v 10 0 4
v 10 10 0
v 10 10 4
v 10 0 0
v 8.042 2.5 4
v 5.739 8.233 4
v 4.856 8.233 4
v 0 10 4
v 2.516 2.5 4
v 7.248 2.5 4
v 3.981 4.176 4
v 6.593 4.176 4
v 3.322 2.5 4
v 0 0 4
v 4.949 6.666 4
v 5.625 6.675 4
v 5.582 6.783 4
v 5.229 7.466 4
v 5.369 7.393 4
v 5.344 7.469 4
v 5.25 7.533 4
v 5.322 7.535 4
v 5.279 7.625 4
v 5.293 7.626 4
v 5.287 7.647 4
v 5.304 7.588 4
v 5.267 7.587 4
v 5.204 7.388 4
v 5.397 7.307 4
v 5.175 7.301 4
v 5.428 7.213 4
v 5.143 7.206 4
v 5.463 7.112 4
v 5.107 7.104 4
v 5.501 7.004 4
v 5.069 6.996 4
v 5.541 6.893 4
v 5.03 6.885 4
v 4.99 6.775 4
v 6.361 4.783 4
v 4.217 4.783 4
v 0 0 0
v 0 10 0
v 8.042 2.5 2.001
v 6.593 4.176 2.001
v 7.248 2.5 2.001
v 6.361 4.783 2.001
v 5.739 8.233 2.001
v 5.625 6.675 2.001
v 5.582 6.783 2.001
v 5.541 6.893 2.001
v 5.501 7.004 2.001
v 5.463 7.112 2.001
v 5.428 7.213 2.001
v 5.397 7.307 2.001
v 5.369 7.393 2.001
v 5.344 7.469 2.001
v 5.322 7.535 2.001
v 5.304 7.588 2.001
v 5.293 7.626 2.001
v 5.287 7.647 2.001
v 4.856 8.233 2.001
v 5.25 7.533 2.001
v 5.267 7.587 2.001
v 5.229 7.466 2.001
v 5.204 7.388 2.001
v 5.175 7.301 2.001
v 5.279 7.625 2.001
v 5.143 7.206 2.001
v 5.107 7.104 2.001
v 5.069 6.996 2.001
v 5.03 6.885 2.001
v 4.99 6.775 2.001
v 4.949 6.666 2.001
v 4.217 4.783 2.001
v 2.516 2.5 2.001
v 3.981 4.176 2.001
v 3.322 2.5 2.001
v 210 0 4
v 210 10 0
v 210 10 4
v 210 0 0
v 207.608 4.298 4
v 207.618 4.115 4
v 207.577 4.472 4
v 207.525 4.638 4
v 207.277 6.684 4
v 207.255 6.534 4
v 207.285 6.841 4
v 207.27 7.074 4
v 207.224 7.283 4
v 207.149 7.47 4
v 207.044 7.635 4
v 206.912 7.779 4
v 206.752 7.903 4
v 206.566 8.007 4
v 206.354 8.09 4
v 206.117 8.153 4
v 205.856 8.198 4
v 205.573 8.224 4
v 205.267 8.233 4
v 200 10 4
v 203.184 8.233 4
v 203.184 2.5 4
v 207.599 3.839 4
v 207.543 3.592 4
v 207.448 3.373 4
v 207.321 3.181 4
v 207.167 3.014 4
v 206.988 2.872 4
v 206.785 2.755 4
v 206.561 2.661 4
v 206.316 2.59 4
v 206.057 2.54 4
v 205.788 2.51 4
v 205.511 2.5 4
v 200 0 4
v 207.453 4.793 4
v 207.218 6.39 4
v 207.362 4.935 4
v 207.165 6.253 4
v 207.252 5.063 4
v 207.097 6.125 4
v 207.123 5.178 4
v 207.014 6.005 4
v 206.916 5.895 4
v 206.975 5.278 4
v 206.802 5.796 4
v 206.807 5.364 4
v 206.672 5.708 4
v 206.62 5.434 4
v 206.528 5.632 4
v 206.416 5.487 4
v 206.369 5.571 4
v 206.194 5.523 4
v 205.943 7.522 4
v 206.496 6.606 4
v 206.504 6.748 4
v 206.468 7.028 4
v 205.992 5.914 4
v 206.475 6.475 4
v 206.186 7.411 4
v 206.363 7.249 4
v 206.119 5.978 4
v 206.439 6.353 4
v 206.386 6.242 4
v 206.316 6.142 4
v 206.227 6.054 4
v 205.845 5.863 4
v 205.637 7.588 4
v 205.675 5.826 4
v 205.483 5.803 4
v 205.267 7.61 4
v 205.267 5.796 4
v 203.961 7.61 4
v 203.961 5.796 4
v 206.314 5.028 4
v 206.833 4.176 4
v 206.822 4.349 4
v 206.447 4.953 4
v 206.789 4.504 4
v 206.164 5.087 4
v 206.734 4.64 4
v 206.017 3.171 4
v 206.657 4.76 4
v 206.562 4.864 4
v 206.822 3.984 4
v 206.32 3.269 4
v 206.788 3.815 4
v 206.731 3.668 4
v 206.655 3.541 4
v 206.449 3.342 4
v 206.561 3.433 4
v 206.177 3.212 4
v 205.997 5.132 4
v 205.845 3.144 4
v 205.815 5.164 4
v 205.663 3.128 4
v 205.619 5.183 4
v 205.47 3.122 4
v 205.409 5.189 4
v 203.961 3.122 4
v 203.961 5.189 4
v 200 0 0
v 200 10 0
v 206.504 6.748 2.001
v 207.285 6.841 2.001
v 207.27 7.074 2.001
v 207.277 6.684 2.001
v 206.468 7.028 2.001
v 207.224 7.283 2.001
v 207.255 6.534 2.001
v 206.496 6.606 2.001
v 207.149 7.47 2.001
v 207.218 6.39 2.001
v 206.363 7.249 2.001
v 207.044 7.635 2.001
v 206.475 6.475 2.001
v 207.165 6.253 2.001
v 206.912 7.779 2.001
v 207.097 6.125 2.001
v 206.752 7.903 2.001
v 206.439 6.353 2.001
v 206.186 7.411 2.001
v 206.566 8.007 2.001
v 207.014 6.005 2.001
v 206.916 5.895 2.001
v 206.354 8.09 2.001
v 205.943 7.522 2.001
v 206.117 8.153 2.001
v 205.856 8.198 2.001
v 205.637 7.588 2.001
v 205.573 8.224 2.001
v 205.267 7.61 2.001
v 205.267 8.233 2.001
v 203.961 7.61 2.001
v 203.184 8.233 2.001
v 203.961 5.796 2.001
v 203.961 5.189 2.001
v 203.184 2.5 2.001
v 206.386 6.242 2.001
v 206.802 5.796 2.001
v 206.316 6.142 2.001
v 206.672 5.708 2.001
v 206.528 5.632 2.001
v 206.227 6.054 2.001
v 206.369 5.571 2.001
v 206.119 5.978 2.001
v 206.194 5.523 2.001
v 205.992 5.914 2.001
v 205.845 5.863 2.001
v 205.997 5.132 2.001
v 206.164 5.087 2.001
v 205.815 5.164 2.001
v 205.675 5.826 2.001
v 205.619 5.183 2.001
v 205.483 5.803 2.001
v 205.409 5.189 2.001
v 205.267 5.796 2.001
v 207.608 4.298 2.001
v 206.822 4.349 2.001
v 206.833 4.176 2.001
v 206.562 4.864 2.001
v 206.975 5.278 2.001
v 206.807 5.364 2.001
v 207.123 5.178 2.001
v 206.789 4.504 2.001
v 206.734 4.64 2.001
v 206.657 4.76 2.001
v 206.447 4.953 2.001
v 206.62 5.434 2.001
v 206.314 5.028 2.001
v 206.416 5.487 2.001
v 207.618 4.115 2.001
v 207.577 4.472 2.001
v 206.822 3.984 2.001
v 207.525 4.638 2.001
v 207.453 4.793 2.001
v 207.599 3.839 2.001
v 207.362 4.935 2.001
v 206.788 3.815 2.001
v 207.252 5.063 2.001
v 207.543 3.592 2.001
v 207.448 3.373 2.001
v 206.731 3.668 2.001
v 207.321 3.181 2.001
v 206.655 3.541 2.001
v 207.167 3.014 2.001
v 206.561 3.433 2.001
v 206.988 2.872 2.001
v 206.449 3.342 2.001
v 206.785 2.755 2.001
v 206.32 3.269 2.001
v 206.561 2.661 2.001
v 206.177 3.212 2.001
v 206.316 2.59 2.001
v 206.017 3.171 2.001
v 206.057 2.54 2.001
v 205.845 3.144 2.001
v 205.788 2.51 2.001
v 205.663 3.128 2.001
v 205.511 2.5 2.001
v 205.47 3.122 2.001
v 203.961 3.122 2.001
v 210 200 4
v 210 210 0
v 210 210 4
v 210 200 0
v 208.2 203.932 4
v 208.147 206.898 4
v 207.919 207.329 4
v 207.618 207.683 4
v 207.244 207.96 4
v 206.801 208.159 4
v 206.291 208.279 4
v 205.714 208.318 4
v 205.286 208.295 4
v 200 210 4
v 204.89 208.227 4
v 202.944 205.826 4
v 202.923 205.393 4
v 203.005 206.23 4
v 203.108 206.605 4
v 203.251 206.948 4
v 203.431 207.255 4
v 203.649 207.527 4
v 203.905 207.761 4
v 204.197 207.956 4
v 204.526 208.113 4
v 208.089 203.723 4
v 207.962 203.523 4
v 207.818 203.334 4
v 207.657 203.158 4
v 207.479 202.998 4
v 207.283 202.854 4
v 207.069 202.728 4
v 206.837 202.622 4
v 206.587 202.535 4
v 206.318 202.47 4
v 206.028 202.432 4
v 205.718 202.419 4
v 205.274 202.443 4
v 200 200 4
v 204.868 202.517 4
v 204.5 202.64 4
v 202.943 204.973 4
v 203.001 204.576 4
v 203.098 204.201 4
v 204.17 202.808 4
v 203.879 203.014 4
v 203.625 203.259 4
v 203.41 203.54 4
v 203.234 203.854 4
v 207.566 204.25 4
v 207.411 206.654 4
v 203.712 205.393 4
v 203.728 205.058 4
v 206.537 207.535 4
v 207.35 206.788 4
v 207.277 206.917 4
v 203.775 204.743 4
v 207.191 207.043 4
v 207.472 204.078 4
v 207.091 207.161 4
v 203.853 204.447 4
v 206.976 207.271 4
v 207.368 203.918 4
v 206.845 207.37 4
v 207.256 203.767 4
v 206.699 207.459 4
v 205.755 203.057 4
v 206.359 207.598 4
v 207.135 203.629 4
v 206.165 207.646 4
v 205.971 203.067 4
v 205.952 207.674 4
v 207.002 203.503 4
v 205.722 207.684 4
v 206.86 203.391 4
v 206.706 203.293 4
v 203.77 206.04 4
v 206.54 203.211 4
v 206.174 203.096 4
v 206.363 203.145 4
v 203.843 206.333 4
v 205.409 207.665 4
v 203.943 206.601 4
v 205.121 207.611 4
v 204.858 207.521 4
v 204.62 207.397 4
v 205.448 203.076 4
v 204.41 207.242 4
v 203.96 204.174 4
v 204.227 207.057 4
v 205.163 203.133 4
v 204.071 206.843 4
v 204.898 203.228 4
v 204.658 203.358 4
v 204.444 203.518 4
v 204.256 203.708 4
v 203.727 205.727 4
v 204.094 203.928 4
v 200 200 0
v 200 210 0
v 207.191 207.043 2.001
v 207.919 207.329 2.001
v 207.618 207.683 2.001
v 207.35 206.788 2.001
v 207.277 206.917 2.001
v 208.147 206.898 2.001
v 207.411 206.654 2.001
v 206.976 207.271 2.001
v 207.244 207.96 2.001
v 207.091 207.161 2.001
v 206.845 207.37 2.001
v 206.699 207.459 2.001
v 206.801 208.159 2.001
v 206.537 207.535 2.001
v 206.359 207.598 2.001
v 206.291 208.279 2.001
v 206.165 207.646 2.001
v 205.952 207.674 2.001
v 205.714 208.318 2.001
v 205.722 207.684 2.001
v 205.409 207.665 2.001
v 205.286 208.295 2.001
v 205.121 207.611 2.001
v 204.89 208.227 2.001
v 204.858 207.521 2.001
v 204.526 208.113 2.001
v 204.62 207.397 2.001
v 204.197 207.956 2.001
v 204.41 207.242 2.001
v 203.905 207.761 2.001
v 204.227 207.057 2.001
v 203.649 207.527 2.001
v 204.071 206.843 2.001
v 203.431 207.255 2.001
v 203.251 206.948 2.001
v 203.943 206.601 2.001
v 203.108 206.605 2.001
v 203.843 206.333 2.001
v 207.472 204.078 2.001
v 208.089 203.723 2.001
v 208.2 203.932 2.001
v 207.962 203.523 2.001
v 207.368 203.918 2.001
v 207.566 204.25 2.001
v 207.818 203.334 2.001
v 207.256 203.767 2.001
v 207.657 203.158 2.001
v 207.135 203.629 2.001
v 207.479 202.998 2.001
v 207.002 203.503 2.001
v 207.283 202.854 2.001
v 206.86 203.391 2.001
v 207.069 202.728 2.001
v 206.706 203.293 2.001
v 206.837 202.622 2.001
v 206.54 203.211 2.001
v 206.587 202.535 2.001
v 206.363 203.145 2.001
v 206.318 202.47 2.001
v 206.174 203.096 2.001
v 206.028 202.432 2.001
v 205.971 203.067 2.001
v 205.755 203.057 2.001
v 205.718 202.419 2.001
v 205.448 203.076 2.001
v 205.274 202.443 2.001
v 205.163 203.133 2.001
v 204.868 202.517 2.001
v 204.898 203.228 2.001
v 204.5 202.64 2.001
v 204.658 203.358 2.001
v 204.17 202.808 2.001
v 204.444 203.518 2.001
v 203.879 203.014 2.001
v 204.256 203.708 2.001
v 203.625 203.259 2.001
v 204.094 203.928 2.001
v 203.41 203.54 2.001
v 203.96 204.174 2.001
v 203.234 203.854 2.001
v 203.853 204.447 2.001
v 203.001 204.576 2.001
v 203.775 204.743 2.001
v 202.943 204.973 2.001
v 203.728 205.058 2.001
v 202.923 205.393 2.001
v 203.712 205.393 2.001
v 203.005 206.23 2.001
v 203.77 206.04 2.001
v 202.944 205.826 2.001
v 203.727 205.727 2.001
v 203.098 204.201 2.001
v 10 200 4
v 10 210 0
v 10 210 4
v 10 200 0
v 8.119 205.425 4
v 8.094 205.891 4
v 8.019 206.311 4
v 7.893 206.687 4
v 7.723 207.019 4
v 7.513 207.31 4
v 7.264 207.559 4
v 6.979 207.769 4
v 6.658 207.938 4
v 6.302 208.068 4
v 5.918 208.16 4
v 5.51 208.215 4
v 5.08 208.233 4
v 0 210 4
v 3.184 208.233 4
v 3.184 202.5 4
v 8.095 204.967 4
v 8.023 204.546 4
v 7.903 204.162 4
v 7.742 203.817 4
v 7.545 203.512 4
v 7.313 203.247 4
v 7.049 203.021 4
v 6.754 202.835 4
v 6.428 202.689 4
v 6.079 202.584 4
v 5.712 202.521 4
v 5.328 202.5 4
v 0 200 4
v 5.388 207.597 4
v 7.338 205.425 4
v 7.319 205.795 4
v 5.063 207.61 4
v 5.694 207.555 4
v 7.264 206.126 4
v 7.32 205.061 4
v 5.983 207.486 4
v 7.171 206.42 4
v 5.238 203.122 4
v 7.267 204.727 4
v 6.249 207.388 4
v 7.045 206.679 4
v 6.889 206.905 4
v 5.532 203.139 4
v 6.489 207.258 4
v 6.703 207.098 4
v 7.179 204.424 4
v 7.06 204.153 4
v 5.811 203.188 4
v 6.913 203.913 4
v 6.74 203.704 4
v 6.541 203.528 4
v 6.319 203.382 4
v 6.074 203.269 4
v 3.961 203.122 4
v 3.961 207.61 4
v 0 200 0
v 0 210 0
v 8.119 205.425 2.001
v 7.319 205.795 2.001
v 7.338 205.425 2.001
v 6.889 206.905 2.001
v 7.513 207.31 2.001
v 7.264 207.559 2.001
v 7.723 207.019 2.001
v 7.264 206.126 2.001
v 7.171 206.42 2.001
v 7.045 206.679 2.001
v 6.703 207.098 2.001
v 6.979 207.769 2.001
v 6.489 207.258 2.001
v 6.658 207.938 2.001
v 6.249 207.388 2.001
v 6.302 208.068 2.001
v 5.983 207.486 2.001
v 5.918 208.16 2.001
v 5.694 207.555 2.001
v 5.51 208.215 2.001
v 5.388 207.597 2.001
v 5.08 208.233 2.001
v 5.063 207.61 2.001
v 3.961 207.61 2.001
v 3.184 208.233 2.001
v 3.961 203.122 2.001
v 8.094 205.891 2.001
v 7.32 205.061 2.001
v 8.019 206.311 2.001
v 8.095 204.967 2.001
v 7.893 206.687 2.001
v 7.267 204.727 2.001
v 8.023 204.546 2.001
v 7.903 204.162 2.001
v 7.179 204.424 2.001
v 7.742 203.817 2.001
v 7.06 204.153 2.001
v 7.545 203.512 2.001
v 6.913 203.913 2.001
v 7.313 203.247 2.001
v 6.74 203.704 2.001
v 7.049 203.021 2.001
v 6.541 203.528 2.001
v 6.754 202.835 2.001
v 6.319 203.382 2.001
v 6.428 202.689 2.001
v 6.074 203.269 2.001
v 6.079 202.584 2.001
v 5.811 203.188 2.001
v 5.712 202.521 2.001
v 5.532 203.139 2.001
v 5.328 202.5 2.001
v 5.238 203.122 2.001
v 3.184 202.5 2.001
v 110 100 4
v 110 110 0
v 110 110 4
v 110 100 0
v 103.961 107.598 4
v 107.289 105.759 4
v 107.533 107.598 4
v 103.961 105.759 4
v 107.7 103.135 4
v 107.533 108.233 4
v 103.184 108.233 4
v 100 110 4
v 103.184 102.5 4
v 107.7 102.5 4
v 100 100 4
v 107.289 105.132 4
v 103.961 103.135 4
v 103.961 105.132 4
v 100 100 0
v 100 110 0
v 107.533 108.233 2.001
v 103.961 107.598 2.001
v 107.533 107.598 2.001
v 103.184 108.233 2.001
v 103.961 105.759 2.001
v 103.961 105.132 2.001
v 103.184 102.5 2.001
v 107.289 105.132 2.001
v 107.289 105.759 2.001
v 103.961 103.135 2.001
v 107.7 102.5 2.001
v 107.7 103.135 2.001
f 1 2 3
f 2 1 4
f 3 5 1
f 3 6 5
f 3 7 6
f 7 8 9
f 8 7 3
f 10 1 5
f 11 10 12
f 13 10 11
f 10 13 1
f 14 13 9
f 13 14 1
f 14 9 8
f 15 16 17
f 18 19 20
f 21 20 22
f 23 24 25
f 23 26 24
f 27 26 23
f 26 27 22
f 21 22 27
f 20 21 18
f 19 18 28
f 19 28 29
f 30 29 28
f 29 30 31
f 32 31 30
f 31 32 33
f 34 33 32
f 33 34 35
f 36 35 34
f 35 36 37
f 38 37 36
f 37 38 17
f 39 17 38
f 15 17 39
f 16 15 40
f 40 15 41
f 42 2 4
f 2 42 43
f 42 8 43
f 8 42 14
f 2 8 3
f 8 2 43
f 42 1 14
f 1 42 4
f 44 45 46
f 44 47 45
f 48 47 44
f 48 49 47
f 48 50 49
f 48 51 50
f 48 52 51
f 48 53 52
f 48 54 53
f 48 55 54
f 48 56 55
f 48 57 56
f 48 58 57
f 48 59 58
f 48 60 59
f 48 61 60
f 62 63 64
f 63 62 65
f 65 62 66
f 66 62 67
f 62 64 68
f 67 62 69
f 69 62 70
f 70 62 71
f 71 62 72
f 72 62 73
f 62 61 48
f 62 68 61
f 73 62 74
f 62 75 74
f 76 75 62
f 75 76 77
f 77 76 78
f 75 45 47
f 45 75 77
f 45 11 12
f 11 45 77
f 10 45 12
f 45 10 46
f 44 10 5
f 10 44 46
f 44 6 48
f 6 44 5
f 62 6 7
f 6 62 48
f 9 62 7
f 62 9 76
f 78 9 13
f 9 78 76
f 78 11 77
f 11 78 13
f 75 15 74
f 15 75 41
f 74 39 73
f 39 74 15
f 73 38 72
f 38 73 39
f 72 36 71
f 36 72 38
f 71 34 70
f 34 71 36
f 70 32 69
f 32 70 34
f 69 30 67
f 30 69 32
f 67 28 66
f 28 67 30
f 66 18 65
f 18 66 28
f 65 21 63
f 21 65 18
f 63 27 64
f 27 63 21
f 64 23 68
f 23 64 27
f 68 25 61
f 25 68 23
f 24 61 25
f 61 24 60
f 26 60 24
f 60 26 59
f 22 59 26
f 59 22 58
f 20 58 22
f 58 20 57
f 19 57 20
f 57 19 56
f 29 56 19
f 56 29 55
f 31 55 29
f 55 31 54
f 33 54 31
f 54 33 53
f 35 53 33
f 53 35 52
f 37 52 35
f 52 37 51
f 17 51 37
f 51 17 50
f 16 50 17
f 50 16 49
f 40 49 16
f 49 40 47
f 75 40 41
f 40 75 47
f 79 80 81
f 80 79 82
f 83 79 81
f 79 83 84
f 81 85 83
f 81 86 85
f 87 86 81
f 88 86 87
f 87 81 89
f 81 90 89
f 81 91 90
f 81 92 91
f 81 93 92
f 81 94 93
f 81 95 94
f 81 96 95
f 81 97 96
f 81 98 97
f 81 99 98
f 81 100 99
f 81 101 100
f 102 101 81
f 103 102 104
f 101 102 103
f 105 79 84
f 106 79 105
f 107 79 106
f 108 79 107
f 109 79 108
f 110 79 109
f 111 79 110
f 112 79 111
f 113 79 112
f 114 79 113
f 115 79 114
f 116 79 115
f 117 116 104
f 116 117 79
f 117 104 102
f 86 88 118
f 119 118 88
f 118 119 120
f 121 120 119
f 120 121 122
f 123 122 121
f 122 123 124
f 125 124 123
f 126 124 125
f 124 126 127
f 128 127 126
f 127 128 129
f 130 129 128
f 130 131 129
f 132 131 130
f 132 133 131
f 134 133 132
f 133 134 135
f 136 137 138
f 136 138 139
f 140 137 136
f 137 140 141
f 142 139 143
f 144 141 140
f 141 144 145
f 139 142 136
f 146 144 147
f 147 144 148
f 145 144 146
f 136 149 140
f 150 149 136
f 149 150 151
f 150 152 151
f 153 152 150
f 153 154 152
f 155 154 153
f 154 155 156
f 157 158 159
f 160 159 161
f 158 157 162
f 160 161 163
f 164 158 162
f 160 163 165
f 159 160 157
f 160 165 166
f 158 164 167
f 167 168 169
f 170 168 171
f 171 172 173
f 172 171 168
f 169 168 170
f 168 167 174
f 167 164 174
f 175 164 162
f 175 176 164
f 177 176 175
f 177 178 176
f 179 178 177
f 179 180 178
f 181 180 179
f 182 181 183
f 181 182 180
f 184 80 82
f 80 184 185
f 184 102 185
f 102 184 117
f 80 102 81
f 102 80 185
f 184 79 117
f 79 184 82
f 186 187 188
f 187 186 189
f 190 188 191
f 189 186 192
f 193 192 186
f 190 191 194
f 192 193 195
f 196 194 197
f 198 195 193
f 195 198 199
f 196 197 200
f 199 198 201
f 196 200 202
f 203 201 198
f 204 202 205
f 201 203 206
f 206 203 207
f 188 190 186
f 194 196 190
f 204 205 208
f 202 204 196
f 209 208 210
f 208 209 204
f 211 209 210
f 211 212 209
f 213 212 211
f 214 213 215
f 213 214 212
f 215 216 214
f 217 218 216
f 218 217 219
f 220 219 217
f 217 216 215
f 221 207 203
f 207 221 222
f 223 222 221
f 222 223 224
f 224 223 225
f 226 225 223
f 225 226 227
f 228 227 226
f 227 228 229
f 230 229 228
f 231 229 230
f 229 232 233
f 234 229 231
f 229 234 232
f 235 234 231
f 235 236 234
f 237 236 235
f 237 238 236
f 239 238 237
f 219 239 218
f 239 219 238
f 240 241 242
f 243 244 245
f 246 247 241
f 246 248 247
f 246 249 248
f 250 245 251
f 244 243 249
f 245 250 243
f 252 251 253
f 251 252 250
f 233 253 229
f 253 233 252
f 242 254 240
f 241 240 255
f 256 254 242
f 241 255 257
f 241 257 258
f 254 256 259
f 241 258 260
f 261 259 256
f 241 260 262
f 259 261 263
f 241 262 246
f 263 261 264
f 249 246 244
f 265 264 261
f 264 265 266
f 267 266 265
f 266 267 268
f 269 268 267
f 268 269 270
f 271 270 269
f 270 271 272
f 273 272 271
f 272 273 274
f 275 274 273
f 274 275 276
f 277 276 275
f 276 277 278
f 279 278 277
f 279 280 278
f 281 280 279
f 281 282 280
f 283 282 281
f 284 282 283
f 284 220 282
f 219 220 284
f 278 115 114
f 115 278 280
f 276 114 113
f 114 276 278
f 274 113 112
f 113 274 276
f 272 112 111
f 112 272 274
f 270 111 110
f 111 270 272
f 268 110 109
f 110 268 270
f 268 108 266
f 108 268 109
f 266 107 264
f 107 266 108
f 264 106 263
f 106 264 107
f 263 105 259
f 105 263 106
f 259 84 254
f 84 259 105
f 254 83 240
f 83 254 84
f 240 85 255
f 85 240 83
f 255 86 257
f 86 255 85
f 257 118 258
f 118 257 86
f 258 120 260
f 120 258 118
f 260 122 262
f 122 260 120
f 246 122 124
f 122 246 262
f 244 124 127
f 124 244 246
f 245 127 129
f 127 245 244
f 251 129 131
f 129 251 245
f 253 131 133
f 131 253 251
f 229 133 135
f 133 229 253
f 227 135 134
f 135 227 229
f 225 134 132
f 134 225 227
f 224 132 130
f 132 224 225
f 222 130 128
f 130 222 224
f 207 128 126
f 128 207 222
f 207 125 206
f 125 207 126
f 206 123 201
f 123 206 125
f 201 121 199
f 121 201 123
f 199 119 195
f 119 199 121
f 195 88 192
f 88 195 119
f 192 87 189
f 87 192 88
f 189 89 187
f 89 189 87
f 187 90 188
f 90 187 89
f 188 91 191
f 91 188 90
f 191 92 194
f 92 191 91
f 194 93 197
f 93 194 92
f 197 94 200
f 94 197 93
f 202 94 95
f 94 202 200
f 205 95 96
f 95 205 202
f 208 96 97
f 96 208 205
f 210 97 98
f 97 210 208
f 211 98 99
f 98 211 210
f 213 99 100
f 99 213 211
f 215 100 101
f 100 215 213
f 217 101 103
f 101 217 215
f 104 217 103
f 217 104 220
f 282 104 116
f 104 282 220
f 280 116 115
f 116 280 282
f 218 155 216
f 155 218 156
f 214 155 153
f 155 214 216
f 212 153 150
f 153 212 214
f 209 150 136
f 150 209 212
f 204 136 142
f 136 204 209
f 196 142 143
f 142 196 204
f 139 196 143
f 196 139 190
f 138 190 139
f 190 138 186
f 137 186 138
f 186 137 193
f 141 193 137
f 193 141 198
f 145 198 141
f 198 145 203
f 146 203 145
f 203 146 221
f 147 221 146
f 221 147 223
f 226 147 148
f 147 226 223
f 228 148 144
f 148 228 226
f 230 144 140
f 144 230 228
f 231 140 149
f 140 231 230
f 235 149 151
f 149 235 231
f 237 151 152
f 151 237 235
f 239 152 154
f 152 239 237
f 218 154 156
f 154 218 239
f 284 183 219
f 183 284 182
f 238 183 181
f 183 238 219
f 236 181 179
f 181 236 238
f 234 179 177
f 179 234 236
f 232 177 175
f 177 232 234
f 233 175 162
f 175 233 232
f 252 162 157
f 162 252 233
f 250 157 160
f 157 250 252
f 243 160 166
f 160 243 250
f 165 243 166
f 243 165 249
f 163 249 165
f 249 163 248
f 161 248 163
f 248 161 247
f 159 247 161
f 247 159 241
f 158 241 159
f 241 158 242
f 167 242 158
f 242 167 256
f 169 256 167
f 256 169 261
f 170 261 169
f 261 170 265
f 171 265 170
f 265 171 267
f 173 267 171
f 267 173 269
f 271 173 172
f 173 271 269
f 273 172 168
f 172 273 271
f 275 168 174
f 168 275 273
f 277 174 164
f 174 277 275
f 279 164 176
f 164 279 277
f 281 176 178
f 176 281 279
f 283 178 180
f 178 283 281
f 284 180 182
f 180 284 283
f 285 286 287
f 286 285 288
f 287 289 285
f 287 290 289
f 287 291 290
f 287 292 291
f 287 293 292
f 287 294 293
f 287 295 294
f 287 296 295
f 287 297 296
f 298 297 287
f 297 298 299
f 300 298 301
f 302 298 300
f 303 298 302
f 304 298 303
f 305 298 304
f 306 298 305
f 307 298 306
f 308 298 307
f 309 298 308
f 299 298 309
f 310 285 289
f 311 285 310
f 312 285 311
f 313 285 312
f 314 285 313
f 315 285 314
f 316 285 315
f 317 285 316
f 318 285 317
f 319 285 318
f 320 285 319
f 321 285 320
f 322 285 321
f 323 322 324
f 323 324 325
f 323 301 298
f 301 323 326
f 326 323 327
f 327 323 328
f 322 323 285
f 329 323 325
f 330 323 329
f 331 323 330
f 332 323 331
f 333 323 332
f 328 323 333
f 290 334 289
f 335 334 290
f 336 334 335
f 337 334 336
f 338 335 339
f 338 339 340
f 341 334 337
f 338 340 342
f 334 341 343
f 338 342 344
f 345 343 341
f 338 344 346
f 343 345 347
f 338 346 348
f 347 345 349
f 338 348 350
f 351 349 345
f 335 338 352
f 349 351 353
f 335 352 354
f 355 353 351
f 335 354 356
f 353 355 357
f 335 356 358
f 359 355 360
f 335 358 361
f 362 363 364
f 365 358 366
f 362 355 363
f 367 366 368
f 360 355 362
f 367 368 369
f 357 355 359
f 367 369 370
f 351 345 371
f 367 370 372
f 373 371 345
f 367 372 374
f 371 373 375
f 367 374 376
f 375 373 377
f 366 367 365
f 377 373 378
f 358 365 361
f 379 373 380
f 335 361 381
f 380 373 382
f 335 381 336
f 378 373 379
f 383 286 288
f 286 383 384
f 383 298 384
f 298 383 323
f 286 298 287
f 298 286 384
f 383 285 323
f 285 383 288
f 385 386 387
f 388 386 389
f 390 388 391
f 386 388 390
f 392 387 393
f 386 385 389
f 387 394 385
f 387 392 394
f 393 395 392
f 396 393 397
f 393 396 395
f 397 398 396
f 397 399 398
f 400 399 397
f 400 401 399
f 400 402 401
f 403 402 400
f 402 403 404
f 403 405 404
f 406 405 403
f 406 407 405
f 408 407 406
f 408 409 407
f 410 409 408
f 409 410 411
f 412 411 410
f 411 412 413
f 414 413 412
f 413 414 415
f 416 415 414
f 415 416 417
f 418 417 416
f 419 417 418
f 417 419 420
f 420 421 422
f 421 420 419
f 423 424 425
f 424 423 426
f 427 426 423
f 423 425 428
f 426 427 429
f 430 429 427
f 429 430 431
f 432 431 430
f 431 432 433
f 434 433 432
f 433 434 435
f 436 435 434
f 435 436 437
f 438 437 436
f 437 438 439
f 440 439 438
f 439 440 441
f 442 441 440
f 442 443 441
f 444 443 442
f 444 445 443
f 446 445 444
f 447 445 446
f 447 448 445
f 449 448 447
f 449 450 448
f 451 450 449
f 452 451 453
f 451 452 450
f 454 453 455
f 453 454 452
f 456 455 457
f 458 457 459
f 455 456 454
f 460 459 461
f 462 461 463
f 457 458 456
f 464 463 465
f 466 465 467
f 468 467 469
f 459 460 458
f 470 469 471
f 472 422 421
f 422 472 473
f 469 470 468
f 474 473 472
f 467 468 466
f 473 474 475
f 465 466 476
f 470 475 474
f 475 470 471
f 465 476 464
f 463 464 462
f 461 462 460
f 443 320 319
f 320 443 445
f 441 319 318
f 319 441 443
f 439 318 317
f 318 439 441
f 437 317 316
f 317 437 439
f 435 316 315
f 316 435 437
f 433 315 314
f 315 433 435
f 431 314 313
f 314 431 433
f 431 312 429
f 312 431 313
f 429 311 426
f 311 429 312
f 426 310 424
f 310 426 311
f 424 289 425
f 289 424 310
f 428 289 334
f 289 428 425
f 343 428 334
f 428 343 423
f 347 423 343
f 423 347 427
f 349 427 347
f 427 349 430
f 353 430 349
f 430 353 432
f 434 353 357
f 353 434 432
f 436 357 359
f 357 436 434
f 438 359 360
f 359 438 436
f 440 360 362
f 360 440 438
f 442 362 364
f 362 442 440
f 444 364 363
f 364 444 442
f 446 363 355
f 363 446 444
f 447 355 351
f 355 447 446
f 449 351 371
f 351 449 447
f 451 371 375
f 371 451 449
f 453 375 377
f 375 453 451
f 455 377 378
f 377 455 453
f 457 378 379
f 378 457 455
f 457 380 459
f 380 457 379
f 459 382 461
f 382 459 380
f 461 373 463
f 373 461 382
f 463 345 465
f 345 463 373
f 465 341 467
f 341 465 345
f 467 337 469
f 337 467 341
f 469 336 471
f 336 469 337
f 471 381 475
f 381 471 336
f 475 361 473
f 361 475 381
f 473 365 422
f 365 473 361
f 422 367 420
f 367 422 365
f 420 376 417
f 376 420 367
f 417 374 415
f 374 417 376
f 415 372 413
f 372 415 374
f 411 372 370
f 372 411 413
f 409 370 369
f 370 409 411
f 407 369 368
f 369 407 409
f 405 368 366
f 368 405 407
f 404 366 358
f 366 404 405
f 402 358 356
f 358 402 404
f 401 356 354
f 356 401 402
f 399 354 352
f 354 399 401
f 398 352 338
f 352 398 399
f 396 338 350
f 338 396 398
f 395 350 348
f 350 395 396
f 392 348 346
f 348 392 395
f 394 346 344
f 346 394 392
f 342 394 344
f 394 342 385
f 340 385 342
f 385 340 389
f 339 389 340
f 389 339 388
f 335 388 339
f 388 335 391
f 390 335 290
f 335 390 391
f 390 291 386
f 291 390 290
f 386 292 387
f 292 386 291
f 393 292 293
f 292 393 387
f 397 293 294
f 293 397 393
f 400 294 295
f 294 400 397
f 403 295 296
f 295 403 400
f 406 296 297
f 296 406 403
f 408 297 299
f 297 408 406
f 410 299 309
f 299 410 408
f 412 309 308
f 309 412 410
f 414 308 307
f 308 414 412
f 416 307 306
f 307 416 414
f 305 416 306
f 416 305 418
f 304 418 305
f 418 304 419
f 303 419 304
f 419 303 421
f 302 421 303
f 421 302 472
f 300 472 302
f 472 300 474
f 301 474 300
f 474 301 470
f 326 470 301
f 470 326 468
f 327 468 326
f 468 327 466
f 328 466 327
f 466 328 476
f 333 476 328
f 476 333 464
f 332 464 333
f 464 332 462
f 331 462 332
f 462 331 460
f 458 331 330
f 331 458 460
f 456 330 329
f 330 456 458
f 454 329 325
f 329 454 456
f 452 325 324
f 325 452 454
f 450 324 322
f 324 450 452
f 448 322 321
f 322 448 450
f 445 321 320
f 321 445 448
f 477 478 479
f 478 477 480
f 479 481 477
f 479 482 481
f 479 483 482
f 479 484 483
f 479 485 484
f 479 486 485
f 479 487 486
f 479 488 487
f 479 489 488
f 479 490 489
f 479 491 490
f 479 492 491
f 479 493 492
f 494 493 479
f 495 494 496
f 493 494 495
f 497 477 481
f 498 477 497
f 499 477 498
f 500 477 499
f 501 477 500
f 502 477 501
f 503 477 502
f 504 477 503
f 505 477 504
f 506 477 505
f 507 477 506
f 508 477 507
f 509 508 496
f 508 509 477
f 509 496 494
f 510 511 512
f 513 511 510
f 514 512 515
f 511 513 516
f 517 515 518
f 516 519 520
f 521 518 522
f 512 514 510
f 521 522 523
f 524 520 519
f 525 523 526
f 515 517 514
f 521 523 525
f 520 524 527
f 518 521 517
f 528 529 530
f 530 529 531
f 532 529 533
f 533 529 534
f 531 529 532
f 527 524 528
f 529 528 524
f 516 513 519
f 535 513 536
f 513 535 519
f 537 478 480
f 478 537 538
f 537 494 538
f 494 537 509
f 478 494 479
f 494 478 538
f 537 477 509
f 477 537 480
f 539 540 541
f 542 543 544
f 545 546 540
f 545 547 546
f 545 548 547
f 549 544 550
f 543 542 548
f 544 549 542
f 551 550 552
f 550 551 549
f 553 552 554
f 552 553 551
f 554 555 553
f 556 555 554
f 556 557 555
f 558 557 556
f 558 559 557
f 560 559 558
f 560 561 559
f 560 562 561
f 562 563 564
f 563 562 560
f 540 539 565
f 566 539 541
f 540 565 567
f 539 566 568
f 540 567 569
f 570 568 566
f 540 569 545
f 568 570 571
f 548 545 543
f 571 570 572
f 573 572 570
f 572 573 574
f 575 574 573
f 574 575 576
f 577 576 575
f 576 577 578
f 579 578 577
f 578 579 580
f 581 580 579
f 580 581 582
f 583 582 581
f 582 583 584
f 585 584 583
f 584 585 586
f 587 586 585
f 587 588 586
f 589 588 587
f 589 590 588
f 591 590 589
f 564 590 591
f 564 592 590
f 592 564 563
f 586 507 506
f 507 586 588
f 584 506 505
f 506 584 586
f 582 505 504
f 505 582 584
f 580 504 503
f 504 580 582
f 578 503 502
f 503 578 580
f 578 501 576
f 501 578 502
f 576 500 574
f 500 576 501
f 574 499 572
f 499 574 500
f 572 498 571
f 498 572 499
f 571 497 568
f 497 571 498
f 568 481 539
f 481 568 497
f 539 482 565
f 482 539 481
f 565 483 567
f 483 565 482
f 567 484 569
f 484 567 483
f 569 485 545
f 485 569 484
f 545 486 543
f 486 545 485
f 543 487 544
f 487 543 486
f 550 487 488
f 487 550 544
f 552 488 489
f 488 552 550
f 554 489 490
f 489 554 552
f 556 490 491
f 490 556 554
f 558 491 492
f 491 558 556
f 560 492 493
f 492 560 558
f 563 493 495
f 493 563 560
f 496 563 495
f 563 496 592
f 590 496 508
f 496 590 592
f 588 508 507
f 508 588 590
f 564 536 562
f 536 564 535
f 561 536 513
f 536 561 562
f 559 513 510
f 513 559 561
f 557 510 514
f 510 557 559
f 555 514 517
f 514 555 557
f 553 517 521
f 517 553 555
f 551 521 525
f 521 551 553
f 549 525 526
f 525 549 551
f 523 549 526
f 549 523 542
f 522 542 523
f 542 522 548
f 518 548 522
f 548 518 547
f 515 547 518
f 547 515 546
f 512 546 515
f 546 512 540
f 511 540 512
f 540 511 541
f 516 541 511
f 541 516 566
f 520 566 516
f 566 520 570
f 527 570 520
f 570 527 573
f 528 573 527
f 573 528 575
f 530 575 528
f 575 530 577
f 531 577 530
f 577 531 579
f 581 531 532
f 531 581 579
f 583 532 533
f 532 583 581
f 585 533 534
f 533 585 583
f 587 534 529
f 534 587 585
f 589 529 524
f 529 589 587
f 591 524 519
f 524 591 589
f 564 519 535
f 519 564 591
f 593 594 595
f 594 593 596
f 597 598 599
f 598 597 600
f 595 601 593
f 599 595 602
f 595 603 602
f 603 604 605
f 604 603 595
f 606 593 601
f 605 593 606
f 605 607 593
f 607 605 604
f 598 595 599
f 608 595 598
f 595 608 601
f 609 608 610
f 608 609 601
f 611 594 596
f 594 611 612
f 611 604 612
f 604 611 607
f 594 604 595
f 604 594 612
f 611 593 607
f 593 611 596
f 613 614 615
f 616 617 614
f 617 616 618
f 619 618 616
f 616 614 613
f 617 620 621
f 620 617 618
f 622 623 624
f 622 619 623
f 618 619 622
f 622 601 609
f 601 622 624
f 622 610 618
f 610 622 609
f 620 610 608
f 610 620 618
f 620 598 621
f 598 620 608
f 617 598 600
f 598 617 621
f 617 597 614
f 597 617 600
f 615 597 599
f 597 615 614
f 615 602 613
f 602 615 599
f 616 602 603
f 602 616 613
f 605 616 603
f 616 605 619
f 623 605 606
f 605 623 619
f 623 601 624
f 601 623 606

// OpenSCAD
epsilon = 0.001;
module box(text = "", x = 0, y = 0)
{
    translate([x, y, 0]) difference()
    {
        cube([10, 10, 4]);
        translate([2.5,2.5,2 + epsilon]) linear_extrude(2) text(text, size = 6);
    }
}

box("A");
box("B", 200);
box("C", 200, 200);
box("D", 0, 200);
box("E", 100, 100);
